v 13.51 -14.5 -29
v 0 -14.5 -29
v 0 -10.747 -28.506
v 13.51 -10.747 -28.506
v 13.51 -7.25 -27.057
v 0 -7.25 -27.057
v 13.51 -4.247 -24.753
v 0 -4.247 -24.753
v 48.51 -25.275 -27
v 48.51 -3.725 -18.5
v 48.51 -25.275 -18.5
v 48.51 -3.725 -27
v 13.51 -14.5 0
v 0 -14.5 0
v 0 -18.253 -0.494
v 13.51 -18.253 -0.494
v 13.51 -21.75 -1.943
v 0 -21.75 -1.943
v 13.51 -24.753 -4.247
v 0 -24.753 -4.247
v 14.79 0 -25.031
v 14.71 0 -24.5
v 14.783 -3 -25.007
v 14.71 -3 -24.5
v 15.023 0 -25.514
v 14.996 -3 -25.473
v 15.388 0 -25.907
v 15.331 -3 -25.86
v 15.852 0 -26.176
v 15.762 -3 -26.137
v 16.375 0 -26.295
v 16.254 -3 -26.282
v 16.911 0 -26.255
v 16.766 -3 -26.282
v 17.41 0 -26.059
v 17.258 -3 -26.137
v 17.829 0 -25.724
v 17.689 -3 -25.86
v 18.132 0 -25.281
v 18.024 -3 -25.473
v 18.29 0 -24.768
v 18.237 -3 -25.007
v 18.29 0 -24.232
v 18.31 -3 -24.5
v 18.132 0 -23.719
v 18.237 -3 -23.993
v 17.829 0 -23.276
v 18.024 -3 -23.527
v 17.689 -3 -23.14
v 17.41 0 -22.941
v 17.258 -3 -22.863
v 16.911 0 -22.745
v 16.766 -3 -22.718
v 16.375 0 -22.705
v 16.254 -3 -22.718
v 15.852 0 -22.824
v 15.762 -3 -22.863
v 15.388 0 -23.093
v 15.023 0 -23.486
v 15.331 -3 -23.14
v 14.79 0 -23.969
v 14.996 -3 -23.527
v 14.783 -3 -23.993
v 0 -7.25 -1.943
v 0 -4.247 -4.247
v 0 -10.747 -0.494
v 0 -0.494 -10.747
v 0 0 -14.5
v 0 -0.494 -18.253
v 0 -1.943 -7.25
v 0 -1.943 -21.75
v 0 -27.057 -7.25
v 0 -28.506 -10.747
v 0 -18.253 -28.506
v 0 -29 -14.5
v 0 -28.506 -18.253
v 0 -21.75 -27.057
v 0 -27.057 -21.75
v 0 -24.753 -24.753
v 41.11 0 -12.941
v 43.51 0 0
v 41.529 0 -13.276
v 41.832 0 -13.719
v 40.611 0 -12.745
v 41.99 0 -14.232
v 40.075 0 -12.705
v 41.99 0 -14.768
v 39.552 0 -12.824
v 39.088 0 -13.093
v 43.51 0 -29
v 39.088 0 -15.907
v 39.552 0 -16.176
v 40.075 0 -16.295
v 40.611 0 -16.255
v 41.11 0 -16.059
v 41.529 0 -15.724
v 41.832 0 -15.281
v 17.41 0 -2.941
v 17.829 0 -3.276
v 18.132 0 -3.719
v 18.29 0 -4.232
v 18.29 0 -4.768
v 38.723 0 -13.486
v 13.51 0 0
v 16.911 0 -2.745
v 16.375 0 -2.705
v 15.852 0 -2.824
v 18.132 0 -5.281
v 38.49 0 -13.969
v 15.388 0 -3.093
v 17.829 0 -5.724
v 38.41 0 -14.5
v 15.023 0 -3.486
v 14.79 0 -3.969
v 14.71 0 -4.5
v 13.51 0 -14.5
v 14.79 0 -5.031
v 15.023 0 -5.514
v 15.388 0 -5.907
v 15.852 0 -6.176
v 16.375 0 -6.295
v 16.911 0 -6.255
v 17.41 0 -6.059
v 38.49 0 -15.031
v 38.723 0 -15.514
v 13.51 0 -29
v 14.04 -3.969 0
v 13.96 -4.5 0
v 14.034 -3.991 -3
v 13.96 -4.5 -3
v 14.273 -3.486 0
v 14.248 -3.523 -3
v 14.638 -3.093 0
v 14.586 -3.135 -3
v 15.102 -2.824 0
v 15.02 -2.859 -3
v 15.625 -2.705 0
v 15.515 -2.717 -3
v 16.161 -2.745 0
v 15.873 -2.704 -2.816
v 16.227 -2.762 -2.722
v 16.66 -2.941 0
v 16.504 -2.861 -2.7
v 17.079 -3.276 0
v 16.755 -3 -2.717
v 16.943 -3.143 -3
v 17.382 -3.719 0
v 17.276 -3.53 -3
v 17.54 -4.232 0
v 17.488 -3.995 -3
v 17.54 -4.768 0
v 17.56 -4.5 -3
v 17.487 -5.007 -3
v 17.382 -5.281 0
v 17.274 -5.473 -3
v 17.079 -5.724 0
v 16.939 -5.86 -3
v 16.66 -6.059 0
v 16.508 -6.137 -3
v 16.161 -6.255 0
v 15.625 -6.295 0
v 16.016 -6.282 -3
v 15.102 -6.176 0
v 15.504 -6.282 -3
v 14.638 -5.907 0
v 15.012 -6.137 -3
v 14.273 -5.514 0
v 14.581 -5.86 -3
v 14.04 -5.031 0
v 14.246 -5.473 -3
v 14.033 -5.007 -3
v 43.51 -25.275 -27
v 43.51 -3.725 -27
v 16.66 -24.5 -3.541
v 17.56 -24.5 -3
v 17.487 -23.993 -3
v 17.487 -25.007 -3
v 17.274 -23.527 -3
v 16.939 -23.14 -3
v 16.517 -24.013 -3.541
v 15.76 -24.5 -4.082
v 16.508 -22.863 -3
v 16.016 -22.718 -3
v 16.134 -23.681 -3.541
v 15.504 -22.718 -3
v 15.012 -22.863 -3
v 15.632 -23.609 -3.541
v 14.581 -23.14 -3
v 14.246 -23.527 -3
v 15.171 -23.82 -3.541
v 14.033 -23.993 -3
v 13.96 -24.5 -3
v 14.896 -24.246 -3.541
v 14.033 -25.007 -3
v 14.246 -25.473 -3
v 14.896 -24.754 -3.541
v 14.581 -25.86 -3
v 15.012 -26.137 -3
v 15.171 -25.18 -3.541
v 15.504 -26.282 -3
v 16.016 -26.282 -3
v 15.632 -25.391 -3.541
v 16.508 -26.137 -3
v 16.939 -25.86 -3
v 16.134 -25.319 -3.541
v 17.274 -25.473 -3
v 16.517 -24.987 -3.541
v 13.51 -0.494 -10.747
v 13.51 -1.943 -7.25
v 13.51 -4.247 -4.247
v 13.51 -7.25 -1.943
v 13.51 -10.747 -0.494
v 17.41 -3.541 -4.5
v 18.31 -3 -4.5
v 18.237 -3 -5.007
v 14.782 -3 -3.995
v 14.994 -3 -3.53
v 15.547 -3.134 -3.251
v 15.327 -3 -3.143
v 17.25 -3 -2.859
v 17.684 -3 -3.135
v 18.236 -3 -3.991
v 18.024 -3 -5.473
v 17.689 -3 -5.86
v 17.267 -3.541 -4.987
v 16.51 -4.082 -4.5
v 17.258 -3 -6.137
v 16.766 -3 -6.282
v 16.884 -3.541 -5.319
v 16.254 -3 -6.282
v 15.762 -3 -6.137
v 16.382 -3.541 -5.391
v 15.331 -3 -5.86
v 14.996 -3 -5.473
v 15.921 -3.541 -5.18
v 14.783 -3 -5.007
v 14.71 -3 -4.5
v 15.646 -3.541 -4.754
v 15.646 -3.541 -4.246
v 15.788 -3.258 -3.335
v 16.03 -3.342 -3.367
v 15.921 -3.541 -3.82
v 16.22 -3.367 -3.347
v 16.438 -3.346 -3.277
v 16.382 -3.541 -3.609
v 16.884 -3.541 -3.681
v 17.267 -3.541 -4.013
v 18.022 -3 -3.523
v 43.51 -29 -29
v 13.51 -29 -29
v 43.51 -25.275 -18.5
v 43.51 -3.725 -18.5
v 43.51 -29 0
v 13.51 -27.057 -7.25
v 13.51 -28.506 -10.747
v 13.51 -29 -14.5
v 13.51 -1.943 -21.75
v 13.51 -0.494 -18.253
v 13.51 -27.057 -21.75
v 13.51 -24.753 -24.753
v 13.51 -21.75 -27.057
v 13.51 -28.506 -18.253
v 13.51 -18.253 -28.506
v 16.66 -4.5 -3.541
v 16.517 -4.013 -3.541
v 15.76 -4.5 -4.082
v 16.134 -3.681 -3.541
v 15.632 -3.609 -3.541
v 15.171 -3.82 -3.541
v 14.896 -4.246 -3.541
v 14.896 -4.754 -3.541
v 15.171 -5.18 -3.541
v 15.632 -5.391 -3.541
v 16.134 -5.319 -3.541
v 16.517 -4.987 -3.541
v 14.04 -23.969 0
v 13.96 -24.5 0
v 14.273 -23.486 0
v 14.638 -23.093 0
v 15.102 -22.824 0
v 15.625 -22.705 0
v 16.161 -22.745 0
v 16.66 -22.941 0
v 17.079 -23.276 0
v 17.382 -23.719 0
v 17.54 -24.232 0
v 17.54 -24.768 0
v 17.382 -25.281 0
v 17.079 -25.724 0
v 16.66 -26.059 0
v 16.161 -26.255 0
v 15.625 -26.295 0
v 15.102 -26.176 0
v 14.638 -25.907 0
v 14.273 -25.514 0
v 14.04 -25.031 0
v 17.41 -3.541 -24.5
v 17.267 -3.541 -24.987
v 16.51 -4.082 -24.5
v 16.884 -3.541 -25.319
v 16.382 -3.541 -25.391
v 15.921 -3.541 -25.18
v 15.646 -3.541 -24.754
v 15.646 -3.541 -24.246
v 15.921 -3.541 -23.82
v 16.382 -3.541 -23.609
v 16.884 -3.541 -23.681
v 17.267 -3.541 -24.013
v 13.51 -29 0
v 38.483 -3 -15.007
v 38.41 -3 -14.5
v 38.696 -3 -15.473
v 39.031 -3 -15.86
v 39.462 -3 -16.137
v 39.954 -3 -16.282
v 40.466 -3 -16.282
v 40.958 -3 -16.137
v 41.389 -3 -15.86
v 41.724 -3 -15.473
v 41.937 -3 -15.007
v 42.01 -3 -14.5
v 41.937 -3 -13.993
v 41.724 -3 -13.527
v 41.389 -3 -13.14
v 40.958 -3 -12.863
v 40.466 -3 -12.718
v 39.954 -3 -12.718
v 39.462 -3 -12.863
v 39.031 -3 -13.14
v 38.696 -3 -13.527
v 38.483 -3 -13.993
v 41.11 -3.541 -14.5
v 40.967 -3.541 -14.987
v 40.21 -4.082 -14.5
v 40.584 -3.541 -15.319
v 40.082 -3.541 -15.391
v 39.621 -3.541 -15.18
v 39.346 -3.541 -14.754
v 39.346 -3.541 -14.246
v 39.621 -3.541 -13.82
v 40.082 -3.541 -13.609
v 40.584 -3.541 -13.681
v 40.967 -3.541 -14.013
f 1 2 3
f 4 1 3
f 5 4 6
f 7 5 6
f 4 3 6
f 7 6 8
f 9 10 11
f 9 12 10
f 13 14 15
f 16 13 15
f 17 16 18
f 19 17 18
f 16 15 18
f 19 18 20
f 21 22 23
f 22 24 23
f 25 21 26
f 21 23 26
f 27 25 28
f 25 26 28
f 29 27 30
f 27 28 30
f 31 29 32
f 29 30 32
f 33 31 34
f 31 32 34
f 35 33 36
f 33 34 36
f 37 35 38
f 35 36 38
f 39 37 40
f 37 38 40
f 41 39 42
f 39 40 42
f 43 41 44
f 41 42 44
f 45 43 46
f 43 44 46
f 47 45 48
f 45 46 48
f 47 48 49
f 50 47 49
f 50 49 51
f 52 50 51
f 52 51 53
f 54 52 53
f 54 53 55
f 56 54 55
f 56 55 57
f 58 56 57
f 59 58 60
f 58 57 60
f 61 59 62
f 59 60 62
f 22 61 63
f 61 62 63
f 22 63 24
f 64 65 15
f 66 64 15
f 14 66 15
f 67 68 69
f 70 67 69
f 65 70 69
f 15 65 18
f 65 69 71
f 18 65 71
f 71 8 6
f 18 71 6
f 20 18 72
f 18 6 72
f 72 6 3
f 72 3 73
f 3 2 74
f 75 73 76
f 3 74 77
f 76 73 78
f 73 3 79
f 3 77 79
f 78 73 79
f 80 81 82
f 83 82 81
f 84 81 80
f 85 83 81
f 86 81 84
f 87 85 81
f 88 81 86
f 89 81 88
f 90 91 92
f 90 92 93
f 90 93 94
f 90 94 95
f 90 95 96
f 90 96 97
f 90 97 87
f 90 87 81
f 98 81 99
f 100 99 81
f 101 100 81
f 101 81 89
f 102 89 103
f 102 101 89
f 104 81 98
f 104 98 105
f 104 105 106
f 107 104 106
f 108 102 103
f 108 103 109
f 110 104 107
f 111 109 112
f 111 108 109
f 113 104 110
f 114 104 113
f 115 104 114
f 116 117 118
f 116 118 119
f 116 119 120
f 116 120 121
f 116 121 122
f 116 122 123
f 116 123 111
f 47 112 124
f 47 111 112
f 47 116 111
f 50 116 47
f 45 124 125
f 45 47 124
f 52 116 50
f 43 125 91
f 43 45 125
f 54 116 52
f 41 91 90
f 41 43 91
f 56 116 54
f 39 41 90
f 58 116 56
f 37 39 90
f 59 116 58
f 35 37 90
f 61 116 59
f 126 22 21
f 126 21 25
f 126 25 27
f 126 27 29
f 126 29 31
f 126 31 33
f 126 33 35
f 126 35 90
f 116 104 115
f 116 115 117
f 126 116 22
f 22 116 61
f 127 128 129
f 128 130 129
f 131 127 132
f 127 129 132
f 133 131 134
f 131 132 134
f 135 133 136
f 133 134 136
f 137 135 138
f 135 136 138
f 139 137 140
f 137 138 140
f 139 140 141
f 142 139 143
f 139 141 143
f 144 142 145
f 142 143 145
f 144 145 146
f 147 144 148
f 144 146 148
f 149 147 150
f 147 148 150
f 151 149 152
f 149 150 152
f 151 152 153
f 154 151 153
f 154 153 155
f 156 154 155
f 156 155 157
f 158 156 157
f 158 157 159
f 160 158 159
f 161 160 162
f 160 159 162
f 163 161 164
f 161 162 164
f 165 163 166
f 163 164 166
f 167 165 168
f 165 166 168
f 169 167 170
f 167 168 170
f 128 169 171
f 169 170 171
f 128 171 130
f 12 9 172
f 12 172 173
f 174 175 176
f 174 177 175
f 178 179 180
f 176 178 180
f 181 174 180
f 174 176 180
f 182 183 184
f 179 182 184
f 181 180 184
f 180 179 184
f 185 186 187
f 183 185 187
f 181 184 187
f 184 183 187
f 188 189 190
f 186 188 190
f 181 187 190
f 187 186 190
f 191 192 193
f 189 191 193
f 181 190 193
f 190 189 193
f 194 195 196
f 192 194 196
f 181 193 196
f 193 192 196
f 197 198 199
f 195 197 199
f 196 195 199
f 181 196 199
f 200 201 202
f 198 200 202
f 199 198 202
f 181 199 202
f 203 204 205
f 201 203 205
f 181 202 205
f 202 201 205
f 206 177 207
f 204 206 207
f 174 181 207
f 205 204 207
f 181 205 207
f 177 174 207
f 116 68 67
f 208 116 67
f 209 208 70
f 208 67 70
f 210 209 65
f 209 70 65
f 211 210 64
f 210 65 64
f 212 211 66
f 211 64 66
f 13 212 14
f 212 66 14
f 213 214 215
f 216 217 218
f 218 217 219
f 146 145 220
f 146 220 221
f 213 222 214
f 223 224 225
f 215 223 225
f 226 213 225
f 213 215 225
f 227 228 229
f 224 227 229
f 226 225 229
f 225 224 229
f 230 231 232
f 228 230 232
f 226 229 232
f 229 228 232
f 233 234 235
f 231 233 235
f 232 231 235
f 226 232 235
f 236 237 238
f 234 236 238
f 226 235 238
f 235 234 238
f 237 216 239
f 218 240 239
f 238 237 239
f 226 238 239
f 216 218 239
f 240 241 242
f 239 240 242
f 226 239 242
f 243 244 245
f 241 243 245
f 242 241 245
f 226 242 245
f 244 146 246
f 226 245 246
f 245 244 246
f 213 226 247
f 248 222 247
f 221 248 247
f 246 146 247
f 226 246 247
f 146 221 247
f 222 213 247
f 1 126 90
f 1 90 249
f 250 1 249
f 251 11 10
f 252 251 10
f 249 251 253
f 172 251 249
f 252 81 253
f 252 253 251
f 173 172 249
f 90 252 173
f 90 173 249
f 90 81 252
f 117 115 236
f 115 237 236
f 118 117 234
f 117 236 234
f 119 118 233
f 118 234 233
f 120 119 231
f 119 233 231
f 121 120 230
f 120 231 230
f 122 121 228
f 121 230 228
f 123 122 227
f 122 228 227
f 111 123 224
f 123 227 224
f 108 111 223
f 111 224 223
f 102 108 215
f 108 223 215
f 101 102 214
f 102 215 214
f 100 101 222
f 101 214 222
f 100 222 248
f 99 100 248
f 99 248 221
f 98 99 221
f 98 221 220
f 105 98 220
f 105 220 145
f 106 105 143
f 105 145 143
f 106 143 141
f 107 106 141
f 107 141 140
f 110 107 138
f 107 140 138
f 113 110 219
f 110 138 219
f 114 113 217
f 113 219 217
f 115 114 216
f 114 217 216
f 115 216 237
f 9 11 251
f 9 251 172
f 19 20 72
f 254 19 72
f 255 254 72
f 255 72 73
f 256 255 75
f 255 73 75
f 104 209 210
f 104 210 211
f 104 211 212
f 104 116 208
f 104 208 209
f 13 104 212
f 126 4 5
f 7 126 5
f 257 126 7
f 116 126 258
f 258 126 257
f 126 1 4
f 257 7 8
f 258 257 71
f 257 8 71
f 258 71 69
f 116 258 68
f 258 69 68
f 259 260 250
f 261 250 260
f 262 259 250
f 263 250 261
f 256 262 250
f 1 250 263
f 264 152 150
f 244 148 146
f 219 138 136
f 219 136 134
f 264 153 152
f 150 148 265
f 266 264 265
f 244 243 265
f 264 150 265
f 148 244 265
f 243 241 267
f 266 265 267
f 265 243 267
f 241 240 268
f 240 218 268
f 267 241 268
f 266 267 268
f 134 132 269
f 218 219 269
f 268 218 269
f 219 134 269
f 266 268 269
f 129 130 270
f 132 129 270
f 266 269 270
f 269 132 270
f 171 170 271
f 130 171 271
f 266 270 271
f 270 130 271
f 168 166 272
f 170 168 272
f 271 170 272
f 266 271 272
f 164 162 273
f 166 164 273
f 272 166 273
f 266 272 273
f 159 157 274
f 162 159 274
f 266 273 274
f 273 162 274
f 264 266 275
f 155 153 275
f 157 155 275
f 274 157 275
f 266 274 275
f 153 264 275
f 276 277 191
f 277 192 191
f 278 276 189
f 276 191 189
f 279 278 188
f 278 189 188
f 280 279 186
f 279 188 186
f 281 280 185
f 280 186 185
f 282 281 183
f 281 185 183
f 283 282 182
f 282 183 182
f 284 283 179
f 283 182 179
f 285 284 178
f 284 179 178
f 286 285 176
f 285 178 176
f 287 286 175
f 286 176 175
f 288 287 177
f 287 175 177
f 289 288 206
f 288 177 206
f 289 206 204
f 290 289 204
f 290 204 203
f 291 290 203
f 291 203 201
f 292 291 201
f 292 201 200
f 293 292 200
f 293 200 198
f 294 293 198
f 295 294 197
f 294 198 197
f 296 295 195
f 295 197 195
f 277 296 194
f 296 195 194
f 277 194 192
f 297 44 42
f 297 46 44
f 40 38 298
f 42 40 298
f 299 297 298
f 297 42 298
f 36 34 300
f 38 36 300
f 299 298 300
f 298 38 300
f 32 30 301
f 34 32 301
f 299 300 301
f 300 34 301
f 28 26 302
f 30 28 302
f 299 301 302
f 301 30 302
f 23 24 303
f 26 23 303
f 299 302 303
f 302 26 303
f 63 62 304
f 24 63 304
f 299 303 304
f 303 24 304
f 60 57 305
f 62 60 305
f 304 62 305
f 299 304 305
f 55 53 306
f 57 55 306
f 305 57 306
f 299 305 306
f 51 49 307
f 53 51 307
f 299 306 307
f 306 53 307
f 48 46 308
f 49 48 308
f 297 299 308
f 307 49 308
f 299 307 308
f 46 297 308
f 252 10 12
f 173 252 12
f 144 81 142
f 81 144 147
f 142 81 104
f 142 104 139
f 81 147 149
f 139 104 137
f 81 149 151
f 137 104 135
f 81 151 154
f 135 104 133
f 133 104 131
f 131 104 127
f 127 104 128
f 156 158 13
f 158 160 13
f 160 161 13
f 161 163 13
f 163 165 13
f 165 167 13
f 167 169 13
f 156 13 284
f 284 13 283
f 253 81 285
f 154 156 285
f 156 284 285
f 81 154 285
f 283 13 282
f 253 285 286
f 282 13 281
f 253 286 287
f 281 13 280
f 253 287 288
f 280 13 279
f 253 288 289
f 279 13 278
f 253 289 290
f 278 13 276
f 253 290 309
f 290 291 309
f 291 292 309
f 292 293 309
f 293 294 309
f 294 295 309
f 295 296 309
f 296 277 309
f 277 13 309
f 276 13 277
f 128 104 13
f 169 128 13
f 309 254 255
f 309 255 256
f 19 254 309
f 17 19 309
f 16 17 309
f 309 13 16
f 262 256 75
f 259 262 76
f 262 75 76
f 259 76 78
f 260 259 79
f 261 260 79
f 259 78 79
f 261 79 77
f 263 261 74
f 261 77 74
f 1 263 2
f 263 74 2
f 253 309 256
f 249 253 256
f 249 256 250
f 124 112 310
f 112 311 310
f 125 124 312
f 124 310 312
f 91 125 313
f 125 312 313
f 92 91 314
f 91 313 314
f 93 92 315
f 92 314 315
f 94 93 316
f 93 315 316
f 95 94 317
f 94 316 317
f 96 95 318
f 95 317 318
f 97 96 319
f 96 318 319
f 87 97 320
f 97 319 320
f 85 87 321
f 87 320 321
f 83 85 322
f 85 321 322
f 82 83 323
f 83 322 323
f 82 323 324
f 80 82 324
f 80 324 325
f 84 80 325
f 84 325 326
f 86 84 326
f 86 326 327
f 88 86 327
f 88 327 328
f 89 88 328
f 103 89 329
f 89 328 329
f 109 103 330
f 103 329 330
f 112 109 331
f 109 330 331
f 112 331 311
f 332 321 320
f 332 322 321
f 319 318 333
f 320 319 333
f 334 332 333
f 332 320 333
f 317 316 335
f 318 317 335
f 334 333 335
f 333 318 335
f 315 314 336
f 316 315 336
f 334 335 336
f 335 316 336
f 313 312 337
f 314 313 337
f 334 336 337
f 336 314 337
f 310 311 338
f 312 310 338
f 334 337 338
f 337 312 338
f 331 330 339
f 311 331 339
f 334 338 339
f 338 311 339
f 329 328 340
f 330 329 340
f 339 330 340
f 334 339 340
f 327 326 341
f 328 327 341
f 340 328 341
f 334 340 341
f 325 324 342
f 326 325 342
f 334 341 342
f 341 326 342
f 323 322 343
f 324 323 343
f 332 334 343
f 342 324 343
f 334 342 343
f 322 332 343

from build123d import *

# Parameters (mm, degrees)
SKETCH1_W                = 29
SKETCH1_H                = 29
BOSS_EXTRUDE1_DEPTH      = 48.51
CUT_EXTRUDE1_DEPTH       = 13.51
M3_CLEARANCE_HOLE3_D     = 3.6
M3_CLEARANCE_HOLE3_DEPTH = 3
M3_CLEARANCE_HOLE3_TIP   = 1.081549114
SKETCH6_W                = 29
SKETCH6_H                = 29
SKETCH6_W_2              = 8.5
SKETCH6_H_2              = 21.55
CUT_EXTRUDE2_DEPTH       = 5
M3_CLEARANCE_HOLE2_D     = 3.6
M3_CLEARANCE_HOLE2_DEPTH = 3
M3_CLEARANCE_HOLE2_TIP   = 1.081549114


with BuildPart() as part:
    # Sketch1 → Boss-Extrude1 (new body)
    with BuildSketch(Plane(origin=(0, 0, 0), x_dir=(0, -1, 0), z_dir=(1, 0, 0))):
        with Locations((14.5, 14.5)):
            Rectangle(SKETCH1_W, SKETCH1_H)
    extrude(amount=BOSS_EXTRUDE1_DEPTH)

    # Sketch2 → Cut-Extrude1 (cut)
    with BuildSketch(Plane.ZY):
        with BuildLine():
            Line((-14.500000026, 0), (-29, 0))
            Line((-29, 0), (-24.753048327, -4.246951673))
            ThreePointArc((-24.753048327, -4.246951673), (-20.048909781, -1.103746784), (-14.500000026, 0))
        make_face()
        with BuildLine():
            Line((-24.753048327, -4.246951673), (-29, 0))
            Line((-29, 0), (-29, -14.499999948))
            ThreePointArc((-29, -14.499999948), (-27.896253211, -8.951090207), (-24.753048327, -4.246951673))
        make_face()
        with BuildLine():
            ThreePointArc((-14.5, -29), (-24.753048346, -24.753048309), (-29, -14.499999948))
            Line((-29, -14.499999948), (-29, -29))
            Line((-29, -29), (-14.5, -29))
        make_face()
        with BuildLine():
            Line((0, -29), (-4.246951673, -24.753048327))
            ThreePointArc((-4.246951673, -24.753048327), (-8.951090231, -27.896253221), (-14.5, -29))
            Line((-14.5, -29), (0, -29))
        make_face()
        with BuildLine():
            ThreePointArc((0, -14.5), (-1.103746779, -20.048909769), (-4.246951673, -24.753048327))
            Line((-4.246951673, -24.753048327), (0, -29))
            Line((0, -29), (0, -14.5))
        make_face()
        with BuildLine():
            Line((0, 0), (-14.500000026, 0))
            ThreePointArc((-14.500000026, 0), (-4.246951682, -4.246951664), (0, -14.5))
            Line((0, -14.5), (0, 0))
        make_face()
    extrude(amount=-CUT_EXTRUDE1_DEPTH, mode=Mode.SUBTRACT)

    # M3 Clearance Hole3
    with Locations(Plane.XY):
        with Locations((15.76, -24.5), (15.76, -4.5)):
            Hole(M3_CLEARANCE_HOLE3_D / 2, depth=M3_CLEARANCE_HOLE3_DEPTH)
            with Locations((0, 0, -(M3_CLEARANCE_HOLE3_DEPTH + M3_CLEARANCE_HOLE3_TIP / 2))):  # 118° drill point
                Cone(0, M3_CLEARANCE_HOLE3_D / 2, M3_CLEARANCE_HOLE3_TIP, mode=Mode.SUBTRACT)

    # Sketch6 → Cut-Extrude2 (cut)
    with BuildSketch(Plane(origin=(48.51, 0, 0), x_dir=(0, 0, -1), z_dir=(1, 0, 0))):
        with Locations((14.5, -14.5)):
            Rectangle(SKETCH6_W, SKETCH6_H)
        with Locations((22.75, -14.5)):
            Rectangle(SKETCH6_W_2, SKETCH6_H_2, mode=Mode.SUBTRACT)
    extrude(amount=-CUT_EXTRUDE2_DEPTH, mode=Mode.SUBTRACT)

    # M3 Clearance Hole2
    with Locations(Plane(origin=(0, 0, 0), x_dir=(1, 0, 0), z_dir=(0, 1, 0))):
        with Locations((16.51, 24.5), (16.51, 4.5), (40.21, 14.5)):
            Hole(M3_CLEARANCE_HOLE2_D / 2, depth=M3_CLEARANCE_HOLE2_DEPTH)
            with Locations((0, 0, -(M3_CLEARANCE_HOLE2_DEPTH + M3_CLEARANCE_HOLE2_TIP / 2))):  # 118° drill point
                Cone(0, M3_CLEARANCE_HOLE2_D / 2, M3_CLEARANCE_HOLE2_TIP, mode=Mode.SUBTRACT)


solid = part.part
